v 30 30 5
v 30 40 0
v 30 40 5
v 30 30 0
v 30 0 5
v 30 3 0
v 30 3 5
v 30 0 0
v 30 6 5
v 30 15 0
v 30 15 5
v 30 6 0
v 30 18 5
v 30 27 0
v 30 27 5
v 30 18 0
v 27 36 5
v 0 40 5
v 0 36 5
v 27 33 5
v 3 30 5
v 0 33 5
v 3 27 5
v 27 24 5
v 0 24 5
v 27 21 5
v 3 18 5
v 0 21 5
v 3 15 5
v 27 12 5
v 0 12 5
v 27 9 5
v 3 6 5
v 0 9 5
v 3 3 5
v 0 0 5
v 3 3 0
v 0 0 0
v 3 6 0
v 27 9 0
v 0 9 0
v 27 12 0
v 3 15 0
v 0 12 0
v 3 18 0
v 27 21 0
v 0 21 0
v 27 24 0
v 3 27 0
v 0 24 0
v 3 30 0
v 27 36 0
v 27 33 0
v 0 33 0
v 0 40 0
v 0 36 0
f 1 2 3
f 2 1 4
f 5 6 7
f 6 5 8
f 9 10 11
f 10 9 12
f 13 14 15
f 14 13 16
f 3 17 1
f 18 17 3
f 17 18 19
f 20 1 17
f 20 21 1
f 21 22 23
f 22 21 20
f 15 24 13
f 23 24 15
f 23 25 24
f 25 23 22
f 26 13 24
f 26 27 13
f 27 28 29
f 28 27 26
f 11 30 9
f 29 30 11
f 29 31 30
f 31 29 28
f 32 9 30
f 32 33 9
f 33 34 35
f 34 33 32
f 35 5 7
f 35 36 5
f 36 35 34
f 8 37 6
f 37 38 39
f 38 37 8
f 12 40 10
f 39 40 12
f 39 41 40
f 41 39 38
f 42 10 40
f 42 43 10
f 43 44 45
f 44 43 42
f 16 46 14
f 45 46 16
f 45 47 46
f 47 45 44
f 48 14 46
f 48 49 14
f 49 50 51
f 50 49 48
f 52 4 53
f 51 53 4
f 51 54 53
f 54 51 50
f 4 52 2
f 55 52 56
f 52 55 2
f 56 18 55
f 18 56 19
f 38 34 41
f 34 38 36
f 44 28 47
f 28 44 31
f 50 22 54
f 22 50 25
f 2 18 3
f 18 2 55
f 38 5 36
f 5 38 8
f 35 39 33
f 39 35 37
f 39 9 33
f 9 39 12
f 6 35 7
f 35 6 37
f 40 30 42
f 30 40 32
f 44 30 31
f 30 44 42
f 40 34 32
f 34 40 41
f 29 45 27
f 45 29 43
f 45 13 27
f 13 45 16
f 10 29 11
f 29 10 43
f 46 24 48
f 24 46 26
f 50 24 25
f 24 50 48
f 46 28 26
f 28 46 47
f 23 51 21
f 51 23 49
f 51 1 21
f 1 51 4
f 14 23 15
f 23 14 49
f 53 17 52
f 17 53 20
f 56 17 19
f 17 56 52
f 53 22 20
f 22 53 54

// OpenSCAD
difference() {
  cube([30, 40, 5]);

  translate([3, 3, -1]) cube([30, 3, 12]);
  translate([-3, 9, -1]) cube([30, 3, 12]);
  translate([3, 15, -1]) cube([30, 3, 12]);
  translate([-3, 21, -1]) cube([30, 3, 12]);
  translate([3, 27, -1]) cube([30, 3, 12]);
  translate([-3, 33, -1]) cube([30, 3, 12]);
}
